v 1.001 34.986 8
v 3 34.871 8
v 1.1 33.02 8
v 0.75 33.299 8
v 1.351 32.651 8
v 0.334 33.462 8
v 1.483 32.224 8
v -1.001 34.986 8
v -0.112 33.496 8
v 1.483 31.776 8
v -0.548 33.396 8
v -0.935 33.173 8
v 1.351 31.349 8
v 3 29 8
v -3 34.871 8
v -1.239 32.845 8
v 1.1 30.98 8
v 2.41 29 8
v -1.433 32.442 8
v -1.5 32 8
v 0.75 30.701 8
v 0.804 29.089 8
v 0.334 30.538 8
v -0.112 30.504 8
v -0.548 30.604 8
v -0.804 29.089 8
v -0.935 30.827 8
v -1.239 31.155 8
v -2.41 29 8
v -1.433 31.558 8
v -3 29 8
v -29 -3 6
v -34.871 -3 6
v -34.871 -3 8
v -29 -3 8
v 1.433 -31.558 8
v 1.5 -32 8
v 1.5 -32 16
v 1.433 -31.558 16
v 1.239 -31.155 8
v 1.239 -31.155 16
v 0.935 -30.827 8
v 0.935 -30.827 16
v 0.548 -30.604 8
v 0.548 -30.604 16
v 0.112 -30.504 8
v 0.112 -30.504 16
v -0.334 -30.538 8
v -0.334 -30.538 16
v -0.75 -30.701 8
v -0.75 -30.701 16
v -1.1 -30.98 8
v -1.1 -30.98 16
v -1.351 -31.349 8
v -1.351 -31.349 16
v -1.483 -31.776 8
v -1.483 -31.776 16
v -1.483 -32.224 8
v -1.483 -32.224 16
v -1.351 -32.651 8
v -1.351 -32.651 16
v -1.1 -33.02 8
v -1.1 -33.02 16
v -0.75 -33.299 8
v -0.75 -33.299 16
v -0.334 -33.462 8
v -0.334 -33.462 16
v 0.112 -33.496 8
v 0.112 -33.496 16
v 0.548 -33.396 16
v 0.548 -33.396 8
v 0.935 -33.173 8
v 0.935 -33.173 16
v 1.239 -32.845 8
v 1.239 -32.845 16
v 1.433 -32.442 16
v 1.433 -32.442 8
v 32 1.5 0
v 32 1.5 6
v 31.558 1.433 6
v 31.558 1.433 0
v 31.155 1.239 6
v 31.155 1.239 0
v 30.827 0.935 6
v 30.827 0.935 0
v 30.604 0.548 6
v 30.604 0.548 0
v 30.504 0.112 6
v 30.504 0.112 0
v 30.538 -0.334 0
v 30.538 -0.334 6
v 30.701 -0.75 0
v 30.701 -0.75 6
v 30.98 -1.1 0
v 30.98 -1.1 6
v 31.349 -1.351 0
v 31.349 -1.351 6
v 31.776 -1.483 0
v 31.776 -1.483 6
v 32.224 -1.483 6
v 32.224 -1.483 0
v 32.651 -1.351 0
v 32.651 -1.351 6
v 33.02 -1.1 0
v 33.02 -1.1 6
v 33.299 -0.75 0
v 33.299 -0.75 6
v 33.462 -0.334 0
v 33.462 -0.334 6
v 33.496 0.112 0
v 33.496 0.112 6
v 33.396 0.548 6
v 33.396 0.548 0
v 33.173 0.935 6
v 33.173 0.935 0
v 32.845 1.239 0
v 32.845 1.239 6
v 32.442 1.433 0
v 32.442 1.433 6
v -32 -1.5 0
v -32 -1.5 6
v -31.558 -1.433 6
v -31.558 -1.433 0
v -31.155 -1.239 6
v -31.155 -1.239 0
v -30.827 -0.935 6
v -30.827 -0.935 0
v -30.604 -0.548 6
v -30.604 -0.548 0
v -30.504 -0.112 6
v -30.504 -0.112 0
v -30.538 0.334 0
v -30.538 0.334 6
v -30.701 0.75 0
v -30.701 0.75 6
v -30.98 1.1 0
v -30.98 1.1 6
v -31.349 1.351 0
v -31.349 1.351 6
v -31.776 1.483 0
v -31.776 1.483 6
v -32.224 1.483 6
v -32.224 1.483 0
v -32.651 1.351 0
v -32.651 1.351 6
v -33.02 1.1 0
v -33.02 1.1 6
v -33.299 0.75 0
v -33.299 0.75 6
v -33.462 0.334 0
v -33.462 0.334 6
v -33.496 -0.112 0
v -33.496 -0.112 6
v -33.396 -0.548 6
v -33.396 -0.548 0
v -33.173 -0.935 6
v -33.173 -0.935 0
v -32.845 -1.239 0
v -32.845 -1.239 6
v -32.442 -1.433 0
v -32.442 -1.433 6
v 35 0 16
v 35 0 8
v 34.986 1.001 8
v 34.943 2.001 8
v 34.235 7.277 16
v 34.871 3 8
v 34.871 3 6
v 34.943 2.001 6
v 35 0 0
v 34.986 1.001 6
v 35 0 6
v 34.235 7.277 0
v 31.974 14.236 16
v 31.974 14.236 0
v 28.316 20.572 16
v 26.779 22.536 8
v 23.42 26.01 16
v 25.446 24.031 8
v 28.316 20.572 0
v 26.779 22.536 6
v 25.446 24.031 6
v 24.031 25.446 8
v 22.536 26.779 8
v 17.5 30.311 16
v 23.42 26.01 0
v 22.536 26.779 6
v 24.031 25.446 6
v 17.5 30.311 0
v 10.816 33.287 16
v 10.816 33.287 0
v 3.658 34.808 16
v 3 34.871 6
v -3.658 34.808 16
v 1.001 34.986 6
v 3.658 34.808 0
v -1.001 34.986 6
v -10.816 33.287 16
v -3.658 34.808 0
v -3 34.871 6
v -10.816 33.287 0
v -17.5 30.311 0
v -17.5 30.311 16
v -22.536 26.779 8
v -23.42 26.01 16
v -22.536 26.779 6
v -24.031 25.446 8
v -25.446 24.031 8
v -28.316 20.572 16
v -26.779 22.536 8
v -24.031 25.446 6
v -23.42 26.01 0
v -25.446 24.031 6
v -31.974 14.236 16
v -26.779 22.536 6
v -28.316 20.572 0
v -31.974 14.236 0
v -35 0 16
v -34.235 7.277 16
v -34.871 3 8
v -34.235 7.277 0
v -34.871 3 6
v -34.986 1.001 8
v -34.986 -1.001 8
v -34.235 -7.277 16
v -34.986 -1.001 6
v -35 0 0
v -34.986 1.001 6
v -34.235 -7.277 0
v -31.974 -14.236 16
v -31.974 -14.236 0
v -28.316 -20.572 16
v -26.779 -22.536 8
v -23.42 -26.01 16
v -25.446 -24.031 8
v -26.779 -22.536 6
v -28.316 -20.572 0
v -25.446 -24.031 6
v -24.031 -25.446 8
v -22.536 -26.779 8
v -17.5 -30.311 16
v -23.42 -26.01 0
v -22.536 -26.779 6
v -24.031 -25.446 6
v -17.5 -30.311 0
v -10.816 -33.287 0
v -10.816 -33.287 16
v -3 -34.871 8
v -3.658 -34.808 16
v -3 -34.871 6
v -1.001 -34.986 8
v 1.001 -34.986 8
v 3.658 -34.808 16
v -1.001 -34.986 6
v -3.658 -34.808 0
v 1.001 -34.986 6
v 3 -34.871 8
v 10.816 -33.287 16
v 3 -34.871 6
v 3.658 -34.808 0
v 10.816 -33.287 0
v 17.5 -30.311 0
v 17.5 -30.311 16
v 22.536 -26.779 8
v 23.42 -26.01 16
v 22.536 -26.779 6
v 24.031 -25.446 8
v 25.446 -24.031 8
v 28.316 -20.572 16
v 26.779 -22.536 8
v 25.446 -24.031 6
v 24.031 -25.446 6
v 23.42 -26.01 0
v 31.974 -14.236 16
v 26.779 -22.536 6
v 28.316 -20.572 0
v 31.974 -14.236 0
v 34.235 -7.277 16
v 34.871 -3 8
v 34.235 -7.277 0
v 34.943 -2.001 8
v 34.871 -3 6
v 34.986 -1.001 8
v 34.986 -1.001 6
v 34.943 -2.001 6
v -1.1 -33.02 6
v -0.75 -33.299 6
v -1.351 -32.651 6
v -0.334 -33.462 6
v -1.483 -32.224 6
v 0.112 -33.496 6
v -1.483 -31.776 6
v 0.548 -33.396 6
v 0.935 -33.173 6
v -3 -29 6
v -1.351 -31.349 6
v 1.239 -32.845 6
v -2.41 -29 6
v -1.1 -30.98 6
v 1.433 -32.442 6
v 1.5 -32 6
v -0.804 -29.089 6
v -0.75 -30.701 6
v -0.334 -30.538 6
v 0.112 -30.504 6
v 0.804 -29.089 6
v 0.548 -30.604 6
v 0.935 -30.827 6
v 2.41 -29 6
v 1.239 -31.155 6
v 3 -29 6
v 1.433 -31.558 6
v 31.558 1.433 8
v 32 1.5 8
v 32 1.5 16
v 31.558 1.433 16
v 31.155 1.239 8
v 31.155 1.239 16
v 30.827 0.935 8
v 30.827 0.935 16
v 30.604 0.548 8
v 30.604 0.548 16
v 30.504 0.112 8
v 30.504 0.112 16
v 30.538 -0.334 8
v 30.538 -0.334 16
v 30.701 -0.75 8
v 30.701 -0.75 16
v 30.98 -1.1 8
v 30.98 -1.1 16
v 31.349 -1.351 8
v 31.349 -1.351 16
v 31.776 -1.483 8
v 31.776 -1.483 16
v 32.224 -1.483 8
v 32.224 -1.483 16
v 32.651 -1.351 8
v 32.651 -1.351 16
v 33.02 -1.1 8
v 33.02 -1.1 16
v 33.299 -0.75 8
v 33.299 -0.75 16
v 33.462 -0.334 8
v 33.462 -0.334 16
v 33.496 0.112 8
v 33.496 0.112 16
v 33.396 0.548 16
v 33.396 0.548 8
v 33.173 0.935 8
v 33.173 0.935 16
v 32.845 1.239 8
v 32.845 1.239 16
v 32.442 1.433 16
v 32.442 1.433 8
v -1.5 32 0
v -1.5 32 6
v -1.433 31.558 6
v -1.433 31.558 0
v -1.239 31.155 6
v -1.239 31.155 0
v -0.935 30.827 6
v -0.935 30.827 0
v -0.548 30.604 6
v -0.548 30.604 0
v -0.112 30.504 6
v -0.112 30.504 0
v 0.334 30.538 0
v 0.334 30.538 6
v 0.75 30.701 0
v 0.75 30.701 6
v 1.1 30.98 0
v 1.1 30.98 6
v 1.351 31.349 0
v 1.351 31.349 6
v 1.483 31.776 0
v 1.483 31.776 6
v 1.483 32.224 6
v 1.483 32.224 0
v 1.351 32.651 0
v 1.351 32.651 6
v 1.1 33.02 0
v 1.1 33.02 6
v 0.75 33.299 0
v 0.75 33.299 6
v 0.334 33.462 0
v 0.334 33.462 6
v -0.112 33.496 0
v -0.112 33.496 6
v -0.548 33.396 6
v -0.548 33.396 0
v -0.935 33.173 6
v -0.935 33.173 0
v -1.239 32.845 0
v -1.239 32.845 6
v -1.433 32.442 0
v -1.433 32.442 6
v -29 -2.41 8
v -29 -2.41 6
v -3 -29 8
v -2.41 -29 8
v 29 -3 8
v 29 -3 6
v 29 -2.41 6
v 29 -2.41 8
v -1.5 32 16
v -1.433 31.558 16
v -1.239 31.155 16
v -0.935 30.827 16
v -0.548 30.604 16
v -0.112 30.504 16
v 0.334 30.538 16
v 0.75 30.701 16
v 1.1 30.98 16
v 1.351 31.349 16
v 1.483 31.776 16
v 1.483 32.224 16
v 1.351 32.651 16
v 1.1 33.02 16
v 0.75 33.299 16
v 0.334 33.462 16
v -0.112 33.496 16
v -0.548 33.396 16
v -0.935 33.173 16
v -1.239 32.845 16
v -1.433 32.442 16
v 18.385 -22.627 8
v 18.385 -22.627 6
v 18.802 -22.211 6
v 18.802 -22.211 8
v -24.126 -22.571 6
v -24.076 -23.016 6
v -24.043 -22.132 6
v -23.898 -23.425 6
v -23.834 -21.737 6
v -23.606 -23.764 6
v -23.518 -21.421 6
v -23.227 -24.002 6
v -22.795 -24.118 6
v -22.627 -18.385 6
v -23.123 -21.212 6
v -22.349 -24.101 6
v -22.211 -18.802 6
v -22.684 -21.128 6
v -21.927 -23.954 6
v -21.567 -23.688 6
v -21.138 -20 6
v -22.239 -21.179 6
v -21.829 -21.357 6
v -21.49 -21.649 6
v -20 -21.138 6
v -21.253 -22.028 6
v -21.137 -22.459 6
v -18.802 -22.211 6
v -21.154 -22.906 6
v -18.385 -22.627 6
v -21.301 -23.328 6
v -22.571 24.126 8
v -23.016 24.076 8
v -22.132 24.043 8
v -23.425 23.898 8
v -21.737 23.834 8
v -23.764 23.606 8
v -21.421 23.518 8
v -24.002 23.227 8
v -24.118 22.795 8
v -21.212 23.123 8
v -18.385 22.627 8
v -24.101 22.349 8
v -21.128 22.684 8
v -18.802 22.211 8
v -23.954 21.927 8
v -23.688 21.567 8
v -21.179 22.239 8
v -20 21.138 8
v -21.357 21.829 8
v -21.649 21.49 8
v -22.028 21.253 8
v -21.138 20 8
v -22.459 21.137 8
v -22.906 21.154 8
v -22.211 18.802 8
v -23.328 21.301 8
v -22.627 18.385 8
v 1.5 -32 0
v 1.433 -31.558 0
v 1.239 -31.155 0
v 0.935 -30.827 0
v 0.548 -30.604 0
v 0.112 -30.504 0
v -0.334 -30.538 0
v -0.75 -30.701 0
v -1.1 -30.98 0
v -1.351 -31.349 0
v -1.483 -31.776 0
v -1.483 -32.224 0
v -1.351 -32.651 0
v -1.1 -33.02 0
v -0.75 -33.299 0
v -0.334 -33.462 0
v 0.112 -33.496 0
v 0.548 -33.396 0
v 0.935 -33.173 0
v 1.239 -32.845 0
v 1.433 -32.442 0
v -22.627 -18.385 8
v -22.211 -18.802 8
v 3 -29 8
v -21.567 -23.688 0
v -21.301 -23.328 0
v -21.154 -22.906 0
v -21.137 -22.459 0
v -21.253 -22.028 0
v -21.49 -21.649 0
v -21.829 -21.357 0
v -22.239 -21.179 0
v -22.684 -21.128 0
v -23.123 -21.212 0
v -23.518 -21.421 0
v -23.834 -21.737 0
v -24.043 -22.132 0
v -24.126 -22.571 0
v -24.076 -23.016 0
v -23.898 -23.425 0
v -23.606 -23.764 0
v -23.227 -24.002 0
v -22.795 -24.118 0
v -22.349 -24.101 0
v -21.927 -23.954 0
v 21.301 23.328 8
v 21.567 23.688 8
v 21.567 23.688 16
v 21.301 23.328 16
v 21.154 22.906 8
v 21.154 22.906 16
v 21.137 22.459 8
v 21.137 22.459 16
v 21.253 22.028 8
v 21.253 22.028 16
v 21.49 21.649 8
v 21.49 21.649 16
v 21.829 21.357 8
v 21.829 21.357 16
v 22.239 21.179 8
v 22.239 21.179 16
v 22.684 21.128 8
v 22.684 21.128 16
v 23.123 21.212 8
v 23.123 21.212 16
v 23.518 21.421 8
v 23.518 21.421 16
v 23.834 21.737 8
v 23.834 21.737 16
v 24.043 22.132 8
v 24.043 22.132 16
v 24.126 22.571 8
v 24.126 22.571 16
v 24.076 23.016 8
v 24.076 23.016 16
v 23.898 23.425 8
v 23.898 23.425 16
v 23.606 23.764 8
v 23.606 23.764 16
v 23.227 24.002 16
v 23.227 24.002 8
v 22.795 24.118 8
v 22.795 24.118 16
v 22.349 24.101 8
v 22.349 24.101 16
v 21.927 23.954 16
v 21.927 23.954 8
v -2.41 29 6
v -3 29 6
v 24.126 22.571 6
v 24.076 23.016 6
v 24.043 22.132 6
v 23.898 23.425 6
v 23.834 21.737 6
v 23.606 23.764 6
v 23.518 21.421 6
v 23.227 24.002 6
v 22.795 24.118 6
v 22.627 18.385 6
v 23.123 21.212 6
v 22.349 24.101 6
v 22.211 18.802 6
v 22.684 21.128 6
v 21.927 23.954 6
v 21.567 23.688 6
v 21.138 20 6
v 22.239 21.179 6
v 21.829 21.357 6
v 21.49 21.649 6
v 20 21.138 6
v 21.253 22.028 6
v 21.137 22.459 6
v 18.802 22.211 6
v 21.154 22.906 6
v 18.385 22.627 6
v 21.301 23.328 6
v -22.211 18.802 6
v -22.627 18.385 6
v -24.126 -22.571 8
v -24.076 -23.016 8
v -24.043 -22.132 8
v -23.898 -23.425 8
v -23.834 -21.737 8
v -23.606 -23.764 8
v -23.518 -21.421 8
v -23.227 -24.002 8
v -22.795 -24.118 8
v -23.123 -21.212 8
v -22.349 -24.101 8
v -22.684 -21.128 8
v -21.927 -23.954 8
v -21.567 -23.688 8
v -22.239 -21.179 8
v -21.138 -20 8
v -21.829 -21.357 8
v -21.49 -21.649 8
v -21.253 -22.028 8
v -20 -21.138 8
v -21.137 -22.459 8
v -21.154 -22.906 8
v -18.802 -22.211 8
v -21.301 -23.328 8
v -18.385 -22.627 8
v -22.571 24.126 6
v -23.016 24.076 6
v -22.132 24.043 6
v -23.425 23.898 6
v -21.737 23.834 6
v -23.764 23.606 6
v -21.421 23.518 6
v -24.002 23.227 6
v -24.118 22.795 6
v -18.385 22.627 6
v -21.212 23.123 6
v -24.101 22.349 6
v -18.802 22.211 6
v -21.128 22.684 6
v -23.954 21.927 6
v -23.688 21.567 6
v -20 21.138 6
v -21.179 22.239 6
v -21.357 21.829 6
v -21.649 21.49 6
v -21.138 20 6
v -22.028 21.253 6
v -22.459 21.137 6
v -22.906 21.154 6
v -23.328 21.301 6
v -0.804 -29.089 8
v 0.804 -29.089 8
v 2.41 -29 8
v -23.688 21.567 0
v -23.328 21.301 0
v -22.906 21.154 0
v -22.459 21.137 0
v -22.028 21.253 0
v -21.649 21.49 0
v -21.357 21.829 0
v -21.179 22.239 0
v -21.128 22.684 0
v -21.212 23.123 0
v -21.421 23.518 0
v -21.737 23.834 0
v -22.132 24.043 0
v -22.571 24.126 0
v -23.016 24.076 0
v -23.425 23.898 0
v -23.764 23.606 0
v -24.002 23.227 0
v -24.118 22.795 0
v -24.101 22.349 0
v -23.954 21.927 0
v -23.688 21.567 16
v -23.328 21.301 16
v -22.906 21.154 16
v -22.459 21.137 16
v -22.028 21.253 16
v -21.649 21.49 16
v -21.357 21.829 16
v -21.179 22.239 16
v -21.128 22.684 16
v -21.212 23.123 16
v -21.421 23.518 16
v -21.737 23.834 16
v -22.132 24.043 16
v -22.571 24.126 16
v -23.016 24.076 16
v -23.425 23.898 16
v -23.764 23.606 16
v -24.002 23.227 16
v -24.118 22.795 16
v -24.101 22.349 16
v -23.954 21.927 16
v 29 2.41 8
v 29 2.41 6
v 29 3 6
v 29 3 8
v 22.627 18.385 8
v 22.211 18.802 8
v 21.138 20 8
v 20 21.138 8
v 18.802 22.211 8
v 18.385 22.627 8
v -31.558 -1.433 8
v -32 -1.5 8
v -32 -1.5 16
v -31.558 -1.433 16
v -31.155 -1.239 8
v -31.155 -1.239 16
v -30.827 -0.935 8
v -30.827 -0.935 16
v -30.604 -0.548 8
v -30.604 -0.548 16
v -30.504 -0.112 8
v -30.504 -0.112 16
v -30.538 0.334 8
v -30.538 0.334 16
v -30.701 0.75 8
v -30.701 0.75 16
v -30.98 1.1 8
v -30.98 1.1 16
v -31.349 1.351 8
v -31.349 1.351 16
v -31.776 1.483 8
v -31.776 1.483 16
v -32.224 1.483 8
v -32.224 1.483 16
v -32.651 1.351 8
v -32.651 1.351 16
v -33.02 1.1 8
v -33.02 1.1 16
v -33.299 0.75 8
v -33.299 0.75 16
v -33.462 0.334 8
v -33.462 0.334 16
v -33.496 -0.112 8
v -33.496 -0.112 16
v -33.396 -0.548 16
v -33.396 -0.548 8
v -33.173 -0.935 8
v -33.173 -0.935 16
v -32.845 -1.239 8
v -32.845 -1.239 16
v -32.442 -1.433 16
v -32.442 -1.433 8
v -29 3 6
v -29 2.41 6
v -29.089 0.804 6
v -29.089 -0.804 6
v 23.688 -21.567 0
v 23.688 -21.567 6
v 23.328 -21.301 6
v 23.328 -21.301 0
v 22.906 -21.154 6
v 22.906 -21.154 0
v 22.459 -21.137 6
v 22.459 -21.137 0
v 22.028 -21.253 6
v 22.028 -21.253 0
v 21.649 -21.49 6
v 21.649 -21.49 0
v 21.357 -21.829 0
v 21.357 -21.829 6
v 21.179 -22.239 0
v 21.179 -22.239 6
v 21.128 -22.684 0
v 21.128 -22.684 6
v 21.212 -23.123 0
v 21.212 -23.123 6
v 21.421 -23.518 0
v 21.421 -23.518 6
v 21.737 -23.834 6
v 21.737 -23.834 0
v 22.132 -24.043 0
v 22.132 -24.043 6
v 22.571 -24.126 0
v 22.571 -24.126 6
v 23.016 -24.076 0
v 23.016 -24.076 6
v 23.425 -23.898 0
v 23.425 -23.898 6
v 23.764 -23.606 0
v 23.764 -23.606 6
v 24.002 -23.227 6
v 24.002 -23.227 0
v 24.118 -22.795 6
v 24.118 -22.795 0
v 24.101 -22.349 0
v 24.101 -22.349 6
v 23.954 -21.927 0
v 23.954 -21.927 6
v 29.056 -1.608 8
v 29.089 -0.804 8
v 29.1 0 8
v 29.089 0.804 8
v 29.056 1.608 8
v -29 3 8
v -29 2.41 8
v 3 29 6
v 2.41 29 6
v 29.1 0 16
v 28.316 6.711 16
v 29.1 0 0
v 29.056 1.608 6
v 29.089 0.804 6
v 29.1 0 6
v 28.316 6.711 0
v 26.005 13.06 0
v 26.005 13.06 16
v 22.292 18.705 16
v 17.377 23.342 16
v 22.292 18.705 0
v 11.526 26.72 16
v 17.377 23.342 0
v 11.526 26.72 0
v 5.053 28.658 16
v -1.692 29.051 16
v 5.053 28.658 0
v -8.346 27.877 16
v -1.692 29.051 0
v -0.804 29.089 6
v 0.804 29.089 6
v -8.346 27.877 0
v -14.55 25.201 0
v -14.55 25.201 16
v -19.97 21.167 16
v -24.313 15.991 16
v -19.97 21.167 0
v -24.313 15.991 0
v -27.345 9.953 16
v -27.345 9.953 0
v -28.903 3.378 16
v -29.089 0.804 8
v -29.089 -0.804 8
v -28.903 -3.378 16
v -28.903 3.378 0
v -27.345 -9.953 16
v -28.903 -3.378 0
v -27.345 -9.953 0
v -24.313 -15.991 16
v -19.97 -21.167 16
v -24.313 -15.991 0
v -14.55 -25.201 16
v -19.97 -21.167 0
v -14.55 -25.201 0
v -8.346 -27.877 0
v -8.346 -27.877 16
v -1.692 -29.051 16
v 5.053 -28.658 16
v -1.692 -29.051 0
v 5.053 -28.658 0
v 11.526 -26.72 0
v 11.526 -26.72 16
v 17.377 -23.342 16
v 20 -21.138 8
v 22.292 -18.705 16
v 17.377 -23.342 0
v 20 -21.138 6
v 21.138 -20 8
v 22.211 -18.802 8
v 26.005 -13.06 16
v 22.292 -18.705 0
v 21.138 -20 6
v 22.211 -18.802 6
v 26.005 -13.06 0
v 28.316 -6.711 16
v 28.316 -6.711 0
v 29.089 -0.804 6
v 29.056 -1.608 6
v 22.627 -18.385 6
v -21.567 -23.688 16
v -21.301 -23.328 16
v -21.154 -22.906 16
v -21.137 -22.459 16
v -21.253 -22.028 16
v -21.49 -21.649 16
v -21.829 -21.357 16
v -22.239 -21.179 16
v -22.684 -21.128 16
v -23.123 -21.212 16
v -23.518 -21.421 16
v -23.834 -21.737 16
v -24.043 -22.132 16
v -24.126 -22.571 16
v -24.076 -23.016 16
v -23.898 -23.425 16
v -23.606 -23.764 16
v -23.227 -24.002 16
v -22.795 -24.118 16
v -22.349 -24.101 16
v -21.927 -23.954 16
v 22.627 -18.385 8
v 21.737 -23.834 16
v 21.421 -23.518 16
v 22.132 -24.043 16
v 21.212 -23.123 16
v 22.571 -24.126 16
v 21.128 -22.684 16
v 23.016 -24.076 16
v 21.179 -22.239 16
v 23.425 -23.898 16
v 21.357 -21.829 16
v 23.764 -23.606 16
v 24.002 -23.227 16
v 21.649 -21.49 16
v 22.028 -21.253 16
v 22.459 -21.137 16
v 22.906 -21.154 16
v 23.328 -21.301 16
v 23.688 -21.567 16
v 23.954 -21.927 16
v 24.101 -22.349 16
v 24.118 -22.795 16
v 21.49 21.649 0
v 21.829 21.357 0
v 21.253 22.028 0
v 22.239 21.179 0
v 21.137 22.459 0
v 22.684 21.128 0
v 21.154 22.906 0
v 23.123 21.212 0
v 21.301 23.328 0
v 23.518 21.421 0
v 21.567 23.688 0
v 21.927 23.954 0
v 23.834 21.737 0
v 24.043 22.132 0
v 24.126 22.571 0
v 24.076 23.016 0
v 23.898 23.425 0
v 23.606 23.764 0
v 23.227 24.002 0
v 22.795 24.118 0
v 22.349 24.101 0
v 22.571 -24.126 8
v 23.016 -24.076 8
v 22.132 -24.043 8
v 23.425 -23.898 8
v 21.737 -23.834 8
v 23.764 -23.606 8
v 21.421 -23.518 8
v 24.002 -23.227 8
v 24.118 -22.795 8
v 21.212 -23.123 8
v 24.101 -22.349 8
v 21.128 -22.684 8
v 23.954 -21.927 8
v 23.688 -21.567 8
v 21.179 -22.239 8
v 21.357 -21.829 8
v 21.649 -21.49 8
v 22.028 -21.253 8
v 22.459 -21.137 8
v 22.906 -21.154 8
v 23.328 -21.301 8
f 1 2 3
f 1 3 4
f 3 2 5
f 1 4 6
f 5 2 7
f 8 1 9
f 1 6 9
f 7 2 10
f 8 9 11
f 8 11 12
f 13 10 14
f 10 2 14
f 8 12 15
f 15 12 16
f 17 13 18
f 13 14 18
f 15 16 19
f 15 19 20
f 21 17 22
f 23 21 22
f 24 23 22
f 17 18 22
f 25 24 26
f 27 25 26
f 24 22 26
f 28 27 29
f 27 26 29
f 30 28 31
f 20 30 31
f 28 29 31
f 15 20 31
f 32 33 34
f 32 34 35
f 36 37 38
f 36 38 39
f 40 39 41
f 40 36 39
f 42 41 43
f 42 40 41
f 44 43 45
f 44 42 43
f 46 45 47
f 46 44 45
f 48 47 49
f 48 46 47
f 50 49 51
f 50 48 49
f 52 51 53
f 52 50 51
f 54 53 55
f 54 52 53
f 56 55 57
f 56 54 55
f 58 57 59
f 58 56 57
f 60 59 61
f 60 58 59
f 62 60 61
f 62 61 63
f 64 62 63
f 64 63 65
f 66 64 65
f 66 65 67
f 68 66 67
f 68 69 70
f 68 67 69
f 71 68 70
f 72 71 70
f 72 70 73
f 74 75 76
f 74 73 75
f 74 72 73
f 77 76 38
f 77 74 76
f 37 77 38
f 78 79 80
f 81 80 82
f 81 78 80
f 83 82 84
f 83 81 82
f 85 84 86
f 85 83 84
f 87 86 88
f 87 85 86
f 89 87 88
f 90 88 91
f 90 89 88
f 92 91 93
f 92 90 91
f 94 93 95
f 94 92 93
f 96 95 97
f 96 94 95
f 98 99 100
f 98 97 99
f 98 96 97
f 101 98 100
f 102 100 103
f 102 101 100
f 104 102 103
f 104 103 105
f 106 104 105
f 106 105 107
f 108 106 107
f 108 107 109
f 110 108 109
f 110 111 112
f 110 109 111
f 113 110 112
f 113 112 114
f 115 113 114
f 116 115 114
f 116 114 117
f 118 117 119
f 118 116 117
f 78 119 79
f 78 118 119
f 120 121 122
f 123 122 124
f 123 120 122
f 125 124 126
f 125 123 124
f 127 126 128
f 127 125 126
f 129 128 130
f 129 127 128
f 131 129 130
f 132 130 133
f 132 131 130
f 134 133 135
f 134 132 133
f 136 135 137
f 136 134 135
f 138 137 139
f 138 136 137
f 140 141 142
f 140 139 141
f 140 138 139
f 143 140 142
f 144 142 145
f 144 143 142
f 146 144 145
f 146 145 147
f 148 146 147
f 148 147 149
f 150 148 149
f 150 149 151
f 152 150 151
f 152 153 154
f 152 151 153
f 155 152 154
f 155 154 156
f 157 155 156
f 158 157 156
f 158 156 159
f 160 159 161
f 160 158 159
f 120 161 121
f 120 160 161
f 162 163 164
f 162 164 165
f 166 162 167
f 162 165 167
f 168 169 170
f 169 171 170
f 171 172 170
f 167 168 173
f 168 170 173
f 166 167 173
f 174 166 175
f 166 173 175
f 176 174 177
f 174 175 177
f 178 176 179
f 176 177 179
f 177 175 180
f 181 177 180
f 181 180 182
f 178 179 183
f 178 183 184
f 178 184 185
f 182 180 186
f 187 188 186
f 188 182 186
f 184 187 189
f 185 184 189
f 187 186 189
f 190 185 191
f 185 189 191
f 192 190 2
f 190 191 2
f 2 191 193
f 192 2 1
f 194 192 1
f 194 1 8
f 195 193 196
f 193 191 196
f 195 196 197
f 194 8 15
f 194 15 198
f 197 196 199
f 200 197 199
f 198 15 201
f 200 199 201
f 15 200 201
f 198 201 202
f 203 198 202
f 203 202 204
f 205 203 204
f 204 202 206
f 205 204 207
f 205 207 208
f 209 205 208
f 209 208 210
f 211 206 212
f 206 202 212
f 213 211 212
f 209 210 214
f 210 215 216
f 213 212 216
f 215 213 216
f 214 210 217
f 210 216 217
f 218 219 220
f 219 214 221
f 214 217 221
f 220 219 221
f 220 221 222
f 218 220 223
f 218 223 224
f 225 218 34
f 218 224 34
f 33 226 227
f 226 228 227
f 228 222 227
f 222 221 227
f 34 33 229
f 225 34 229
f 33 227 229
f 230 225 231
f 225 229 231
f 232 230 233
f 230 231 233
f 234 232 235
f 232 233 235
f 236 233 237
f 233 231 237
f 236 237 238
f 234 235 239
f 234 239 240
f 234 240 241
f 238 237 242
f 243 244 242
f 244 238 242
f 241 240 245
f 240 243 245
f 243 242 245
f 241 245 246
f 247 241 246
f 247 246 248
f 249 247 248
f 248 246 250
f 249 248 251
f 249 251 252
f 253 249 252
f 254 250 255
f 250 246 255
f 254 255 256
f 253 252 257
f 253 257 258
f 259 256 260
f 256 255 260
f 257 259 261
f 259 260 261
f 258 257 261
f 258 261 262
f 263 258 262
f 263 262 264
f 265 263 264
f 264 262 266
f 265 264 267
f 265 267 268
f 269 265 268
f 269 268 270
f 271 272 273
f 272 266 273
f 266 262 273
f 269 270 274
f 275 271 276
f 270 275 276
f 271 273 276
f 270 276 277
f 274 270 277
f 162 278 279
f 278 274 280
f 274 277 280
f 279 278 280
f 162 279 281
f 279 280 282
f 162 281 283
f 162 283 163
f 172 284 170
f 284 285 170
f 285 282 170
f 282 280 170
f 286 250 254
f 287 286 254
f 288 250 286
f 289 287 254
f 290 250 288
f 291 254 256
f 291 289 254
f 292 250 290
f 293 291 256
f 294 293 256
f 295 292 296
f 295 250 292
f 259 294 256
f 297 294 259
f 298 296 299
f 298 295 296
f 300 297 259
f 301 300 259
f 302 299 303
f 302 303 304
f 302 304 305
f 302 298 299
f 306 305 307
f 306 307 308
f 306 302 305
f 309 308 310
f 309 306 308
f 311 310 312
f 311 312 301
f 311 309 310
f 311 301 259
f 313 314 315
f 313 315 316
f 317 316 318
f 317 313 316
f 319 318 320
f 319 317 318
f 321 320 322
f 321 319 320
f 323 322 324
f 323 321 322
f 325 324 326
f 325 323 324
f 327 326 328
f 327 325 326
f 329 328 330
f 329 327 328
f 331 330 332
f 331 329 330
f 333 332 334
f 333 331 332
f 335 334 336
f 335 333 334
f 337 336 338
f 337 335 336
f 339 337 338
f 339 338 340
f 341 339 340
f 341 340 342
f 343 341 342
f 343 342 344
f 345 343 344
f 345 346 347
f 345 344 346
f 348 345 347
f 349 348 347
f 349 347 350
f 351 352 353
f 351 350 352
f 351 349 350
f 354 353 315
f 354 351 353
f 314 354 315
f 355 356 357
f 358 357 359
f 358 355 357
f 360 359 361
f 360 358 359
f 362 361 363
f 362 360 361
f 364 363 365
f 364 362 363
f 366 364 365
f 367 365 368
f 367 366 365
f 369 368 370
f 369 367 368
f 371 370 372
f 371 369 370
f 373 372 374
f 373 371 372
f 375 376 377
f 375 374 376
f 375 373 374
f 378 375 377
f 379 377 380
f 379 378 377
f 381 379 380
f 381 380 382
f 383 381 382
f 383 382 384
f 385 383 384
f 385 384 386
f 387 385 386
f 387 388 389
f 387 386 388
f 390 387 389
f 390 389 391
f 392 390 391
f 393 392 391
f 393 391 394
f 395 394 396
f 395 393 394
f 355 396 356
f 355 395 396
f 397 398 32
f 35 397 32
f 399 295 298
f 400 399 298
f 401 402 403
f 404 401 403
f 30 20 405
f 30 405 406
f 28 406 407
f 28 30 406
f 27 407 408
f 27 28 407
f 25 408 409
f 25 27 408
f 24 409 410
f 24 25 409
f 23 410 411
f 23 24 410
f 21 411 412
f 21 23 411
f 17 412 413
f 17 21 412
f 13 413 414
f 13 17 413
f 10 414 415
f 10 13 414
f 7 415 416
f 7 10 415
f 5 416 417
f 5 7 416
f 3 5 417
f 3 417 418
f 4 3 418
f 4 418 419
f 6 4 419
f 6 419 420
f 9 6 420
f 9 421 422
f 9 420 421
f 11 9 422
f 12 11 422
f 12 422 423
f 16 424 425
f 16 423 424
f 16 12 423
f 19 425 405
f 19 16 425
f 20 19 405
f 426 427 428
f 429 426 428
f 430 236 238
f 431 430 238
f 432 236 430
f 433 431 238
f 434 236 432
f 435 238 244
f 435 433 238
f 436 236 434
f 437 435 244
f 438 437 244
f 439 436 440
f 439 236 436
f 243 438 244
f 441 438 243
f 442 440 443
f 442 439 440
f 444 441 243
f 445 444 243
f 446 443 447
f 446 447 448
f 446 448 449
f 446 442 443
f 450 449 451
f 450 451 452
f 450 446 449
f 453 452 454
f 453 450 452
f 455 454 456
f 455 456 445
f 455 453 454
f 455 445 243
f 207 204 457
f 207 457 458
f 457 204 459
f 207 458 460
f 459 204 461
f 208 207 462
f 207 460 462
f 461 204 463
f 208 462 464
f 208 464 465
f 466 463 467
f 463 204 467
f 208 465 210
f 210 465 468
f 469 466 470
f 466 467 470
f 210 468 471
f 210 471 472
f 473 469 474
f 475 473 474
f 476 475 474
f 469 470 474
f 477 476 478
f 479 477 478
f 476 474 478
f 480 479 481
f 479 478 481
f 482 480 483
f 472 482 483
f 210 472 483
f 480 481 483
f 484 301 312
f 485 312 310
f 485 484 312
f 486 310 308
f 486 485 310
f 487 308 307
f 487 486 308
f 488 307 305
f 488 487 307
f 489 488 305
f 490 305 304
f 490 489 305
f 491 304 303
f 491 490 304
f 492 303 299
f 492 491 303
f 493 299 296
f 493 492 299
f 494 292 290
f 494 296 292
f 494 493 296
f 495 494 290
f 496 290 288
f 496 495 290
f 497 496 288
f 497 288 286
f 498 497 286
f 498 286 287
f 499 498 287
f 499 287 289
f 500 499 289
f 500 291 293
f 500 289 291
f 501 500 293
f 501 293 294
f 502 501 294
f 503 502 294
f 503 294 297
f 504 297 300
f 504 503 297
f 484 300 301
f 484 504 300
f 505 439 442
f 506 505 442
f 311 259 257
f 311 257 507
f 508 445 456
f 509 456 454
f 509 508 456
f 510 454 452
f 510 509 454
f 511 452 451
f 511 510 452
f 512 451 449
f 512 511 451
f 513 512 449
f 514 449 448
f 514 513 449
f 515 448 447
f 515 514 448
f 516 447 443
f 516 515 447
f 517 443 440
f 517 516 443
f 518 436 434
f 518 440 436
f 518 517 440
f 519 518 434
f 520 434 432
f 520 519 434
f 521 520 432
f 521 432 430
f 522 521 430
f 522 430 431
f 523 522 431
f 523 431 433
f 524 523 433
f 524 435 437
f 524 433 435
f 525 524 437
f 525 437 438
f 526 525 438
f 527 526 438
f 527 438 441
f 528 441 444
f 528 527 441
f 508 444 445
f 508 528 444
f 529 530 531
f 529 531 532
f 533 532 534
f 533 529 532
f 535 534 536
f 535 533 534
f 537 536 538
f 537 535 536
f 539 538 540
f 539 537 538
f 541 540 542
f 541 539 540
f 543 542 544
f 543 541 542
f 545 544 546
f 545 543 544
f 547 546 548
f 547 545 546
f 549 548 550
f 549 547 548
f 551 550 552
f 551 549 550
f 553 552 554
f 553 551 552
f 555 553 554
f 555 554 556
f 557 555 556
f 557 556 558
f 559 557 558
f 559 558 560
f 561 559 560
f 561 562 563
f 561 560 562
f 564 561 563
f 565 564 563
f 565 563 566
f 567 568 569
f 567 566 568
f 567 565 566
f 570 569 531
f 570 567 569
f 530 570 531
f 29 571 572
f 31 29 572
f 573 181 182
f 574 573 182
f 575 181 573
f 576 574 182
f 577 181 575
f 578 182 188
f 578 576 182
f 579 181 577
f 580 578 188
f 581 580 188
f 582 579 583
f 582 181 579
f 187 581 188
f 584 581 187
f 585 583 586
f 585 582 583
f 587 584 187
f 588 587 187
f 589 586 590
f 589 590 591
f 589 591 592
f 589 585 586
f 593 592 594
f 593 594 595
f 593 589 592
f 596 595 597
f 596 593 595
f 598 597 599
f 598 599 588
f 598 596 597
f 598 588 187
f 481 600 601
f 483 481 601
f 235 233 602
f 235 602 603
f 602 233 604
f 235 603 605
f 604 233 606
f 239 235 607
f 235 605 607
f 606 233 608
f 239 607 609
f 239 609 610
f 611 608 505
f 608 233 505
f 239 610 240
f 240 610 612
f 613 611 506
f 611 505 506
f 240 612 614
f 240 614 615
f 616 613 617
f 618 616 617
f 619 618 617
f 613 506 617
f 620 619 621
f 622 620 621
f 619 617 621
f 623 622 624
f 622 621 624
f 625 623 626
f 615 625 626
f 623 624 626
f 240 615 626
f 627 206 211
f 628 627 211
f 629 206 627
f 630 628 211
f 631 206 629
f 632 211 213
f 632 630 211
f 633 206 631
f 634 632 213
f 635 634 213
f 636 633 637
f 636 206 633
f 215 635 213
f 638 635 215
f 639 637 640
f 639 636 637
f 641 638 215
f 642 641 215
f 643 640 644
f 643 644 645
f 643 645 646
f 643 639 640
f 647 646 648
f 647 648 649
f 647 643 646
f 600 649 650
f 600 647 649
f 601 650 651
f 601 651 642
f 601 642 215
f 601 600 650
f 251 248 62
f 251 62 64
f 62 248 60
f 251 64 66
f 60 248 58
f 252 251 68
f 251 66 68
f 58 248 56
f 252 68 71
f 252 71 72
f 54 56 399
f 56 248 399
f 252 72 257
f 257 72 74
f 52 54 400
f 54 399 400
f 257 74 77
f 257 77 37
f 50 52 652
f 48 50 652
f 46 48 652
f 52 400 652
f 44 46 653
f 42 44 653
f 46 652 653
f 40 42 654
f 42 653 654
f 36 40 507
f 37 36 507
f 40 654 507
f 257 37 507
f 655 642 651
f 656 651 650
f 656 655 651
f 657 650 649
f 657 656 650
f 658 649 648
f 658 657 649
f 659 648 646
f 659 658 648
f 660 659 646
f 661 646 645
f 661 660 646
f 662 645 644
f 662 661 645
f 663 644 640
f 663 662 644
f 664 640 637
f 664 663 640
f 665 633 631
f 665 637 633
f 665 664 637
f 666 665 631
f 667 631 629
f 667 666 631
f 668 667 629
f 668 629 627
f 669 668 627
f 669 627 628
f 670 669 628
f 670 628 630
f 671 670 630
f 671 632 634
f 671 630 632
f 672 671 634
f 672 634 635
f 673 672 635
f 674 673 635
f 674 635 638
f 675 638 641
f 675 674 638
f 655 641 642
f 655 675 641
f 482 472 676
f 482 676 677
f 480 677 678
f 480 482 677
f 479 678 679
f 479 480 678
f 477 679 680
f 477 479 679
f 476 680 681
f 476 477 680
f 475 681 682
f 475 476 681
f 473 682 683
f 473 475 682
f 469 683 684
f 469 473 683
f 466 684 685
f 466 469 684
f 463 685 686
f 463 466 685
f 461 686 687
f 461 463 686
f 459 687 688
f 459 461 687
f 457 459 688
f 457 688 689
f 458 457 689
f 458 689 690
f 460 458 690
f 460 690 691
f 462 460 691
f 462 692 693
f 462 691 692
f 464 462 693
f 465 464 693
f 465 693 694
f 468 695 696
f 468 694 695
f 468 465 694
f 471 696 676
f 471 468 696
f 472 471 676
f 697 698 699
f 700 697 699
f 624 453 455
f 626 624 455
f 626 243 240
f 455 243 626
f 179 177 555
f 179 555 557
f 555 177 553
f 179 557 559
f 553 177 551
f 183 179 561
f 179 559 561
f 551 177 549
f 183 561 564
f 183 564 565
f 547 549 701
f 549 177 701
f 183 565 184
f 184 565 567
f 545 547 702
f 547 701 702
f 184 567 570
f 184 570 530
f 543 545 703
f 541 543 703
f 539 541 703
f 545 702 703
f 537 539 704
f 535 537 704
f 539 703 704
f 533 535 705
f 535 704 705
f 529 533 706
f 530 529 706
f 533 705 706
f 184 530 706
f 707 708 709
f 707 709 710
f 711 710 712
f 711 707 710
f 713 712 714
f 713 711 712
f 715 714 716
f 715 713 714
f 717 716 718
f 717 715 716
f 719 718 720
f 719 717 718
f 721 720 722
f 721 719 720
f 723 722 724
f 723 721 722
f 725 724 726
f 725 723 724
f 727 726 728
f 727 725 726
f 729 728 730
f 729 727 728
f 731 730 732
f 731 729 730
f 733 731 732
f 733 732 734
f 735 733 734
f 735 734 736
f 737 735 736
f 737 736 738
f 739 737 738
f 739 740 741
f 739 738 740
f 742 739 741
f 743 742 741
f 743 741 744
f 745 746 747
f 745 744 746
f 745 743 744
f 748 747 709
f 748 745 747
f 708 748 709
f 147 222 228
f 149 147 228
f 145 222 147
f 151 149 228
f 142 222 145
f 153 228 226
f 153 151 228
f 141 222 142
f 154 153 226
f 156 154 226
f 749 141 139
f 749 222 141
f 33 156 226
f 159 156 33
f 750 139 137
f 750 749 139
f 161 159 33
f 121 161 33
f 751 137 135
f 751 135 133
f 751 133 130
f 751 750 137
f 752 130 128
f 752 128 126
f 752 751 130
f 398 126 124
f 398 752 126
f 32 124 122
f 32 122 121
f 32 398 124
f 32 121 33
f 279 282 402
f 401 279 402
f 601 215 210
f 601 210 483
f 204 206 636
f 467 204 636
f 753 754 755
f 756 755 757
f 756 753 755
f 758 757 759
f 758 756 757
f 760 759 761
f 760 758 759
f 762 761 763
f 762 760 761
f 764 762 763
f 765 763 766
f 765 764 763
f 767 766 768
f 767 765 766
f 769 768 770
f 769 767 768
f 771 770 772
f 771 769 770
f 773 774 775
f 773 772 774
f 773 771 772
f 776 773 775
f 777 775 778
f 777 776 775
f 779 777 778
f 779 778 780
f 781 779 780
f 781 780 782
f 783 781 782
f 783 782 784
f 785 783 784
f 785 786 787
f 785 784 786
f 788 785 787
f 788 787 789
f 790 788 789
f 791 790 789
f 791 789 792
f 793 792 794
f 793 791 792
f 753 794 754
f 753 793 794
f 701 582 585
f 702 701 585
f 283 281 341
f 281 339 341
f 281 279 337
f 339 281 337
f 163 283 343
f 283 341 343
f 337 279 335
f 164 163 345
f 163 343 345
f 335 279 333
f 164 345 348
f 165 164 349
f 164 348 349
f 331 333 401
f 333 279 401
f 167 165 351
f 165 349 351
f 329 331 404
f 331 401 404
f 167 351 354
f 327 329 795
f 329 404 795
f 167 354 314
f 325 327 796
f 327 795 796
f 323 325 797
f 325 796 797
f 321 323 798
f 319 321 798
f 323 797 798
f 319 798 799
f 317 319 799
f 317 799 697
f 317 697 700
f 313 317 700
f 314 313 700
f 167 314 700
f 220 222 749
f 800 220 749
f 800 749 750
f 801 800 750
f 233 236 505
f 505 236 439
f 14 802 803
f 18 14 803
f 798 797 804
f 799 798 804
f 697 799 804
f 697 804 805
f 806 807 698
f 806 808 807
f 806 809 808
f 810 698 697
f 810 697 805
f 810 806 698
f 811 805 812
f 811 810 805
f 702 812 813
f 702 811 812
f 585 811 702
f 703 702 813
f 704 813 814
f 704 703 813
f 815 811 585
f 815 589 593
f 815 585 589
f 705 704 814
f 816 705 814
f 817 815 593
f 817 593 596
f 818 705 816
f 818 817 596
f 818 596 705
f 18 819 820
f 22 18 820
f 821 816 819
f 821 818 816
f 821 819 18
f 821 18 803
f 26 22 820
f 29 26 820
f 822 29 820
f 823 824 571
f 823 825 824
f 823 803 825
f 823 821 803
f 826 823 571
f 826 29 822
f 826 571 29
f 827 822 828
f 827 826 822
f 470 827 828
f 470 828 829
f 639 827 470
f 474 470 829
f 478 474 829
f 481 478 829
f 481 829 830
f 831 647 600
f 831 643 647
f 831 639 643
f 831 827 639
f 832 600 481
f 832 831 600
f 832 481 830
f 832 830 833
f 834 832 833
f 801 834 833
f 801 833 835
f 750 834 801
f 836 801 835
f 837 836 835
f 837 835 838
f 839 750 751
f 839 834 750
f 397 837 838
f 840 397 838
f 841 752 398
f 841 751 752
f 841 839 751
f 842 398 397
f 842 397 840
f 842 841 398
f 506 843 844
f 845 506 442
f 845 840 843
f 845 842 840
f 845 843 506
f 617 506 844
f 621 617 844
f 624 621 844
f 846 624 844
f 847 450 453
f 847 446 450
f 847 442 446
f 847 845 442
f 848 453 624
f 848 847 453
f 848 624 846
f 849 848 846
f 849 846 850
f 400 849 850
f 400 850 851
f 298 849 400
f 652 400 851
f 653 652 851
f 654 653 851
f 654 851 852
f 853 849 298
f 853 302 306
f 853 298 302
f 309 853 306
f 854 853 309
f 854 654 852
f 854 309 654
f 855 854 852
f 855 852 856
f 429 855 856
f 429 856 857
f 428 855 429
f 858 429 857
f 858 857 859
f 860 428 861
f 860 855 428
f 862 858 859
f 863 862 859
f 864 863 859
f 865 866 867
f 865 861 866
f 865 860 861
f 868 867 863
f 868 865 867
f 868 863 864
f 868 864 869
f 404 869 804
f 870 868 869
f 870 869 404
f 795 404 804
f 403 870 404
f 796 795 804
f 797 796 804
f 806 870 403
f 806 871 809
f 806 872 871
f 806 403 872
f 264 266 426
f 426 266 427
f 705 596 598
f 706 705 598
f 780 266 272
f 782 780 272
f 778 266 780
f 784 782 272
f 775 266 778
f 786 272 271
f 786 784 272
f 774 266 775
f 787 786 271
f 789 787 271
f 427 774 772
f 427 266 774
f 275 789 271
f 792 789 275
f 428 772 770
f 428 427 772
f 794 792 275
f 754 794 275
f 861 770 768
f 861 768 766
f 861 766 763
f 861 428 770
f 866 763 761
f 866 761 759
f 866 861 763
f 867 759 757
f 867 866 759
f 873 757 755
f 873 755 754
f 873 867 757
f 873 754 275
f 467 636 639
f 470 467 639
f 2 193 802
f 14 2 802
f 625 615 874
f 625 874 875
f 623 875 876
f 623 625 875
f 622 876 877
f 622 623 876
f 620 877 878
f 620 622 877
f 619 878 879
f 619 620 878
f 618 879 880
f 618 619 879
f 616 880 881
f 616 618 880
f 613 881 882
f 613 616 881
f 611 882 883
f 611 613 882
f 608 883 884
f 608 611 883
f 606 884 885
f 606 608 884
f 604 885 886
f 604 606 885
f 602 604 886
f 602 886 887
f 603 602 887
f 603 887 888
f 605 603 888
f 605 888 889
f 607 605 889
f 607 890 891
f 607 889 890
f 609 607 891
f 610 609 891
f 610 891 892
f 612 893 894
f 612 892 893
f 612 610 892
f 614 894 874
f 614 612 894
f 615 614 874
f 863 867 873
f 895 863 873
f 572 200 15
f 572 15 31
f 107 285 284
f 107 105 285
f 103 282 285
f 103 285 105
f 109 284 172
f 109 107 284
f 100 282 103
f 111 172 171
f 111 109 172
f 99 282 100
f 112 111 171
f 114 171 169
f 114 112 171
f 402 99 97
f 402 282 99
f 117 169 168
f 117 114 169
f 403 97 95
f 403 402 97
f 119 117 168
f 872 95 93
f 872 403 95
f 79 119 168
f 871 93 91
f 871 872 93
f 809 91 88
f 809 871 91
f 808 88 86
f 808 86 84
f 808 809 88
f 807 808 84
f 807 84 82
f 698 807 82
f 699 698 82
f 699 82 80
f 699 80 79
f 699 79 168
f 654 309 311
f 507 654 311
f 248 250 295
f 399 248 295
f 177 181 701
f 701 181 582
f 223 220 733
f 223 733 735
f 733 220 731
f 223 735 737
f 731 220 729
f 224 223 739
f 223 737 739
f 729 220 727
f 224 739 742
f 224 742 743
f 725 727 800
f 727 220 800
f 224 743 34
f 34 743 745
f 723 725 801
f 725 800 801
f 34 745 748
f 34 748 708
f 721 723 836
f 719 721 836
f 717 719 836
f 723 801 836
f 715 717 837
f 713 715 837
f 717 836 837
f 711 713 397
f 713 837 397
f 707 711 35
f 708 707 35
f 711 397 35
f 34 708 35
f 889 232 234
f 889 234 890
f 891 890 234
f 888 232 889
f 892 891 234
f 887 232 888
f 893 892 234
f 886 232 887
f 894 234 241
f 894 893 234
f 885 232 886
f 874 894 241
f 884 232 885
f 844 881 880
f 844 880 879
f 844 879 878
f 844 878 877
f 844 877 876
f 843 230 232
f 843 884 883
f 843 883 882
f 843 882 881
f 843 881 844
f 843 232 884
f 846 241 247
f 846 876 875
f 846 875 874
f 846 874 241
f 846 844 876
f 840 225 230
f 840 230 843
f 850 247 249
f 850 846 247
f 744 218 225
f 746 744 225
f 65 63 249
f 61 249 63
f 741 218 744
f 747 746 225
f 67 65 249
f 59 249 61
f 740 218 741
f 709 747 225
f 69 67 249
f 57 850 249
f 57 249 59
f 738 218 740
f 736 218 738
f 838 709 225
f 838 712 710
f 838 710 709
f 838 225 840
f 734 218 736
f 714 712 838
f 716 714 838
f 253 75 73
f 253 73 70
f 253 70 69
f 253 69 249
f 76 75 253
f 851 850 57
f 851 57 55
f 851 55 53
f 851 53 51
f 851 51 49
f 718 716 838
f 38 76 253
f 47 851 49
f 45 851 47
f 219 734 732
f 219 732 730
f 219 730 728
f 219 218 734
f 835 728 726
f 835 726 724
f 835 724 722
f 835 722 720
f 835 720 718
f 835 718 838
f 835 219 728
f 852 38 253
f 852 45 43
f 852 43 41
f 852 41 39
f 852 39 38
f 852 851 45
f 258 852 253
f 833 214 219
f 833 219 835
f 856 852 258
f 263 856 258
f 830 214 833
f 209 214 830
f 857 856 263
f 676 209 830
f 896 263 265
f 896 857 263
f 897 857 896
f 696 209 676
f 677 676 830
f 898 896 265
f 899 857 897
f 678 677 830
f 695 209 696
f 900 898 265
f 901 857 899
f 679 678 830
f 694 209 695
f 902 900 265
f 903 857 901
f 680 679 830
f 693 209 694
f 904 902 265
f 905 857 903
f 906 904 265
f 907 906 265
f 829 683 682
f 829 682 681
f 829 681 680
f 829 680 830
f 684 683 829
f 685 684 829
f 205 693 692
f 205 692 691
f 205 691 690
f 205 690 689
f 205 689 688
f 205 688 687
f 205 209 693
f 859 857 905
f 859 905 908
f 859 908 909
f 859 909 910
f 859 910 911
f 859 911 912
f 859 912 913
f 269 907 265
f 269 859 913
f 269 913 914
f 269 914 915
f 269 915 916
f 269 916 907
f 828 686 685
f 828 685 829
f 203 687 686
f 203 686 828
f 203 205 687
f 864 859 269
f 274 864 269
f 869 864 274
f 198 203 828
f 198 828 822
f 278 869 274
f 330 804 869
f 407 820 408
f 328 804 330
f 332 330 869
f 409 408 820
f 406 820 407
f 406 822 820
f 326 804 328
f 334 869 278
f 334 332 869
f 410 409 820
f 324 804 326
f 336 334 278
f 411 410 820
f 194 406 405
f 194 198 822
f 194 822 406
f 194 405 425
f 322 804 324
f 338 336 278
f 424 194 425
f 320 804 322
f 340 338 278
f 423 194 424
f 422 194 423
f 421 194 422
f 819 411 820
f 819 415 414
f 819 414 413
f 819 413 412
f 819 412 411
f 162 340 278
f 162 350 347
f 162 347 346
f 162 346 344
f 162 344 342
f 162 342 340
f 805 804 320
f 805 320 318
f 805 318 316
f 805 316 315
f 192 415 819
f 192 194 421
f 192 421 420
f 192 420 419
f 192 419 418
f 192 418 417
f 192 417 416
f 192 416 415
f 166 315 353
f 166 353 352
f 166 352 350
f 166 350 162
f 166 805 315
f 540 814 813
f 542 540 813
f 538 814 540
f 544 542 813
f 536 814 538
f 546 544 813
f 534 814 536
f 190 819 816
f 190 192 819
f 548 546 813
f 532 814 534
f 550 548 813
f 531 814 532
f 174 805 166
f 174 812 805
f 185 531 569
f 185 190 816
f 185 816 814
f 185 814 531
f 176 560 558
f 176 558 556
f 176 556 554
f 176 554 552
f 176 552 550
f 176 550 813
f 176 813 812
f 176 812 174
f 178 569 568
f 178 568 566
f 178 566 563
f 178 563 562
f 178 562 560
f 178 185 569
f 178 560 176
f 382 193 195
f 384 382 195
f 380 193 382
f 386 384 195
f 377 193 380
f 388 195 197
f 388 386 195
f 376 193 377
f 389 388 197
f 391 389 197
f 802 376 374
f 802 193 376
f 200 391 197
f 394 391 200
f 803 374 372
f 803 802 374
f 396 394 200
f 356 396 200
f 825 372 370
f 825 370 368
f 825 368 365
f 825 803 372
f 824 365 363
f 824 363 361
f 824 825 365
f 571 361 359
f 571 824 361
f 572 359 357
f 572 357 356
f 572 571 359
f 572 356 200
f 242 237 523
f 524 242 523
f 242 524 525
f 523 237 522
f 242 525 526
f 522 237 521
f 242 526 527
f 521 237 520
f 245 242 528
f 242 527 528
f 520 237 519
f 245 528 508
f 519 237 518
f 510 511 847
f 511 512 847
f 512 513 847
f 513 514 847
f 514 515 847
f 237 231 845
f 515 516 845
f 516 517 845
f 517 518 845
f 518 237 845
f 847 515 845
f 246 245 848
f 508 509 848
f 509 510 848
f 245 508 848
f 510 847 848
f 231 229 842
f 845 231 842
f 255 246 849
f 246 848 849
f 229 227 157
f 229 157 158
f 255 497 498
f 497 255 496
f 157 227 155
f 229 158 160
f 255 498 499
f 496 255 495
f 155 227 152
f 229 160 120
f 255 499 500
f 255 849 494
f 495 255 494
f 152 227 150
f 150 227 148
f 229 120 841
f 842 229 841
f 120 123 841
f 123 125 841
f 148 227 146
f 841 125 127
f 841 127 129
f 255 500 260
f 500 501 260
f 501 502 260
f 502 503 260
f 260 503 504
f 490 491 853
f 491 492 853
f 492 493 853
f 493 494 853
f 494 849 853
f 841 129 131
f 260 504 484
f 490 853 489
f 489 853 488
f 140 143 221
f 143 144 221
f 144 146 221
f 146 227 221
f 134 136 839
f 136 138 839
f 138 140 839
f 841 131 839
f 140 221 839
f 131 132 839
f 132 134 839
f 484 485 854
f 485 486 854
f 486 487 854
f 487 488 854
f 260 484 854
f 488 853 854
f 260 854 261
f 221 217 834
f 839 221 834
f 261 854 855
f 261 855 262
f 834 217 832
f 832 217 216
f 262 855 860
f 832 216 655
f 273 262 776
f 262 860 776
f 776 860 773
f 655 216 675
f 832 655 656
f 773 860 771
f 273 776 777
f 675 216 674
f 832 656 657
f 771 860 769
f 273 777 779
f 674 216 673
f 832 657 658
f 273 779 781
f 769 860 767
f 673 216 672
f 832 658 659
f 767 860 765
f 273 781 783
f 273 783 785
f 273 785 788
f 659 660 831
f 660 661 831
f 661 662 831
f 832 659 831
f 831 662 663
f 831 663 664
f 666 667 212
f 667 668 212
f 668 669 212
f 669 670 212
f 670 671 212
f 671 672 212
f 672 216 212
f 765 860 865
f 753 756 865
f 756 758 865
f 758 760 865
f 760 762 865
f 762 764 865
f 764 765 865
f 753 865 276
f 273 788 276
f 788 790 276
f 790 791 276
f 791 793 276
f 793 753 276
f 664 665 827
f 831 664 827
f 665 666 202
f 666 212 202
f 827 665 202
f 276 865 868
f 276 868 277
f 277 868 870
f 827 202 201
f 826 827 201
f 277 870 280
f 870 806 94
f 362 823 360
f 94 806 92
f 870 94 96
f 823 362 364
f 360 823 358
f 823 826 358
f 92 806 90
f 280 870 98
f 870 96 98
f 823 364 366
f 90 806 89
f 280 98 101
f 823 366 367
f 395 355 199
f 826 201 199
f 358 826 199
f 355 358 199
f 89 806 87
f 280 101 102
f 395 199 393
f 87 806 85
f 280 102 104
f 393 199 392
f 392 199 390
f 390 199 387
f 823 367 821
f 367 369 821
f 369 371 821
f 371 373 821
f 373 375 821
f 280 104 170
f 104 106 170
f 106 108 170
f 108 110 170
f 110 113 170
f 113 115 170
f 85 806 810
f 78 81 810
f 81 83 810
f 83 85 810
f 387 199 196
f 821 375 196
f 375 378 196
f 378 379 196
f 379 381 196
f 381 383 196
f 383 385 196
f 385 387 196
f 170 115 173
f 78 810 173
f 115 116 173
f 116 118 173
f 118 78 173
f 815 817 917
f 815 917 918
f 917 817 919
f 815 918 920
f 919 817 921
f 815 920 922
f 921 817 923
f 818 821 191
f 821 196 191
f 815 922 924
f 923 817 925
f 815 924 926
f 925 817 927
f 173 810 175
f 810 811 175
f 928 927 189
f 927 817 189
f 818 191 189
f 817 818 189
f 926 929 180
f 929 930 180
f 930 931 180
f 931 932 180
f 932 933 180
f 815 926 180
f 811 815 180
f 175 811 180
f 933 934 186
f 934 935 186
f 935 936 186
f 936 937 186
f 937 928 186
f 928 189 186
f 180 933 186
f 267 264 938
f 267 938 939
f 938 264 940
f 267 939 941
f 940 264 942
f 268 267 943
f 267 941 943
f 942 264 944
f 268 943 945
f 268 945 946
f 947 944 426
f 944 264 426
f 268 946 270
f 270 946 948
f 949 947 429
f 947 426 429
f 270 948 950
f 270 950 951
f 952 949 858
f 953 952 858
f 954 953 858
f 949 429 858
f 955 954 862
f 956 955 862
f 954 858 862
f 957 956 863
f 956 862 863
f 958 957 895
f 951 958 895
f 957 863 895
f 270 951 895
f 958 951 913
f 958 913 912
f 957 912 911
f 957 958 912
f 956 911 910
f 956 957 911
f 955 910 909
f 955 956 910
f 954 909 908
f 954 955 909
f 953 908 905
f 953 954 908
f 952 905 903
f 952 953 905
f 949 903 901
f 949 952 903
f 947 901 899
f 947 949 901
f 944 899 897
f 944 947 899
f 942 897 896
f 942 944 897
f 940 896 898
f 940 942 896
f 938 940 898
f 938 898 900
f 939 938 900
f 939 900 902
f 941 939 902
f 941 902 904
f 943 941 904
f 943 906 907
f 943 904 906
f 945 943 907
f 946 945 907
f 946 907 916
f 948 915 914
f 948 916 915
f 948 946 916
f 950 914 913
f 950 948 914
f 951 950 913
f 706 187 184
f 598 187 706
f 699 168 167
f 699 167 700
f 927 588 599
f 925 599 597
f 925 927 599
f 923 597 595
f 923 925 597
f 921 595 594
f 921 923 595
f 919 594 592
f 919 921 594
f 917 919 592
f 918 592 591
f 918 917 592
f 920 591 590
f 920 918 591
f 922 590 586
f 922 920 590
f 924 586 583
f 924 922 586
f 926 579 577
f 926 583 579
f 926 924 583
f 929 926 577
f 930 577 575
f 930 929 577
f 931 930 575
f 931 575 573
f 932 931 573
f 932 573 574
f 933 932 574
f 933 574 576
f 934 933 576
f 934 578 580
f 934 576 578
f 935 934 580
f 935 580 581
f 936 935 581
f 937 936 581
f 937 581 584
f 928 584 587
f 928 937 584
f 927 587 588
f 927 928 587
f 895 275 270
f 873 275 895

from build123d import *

# Parameters (mm, degrees)
BOX697_W                     = 6
BOX697_H                     = 6
BOX697_DEPTH                 = 2
BOX697_PLACEMENT_ANGLE       = 45
BOX703_W                     = 6
BOX703_H                     = 6
BOX703_DEPTH                 = 2
BOX703_PLACEMENT_ANGLE       = 45
BOX702_W                     = 6
BOX702_H                     = 6
BOX702_DEPTH                 = 2
BOX701_W                     = 6
BOX701_H                     = 6
BOX701_DEPTH                 = 2
BOX701_PLACEMENT_ANGLE       = 225
BOX700_W                     = 6
BOX700_H                     = 6
BOX700_DEPTH                 = 2
BOX699_W                     = 6
BOX699_H                     = 6
BOX699_DEPTH                 = 2
BOX699_PLACEMENT_ANGLE       = 135
BOX698_W                     = 6
BOX698_H                     = 6
BOX698_DEPTH                 = 2
BOX696_W                     = 6
BOX696_H                     = 6
BOX696_DEPTH                 = 2
CYLINDER1770_R               = 1.5
CYLINDER1770_DEPTH           = 30
CYLINDER1770_PLACEMENT_ANGLE = 45
CYLINDER1768_R               = 1.5
CYLINDER1768_DEPTH           = 30
CYLINDER1764_R               = 1.5
CYLINDER1764_DEPTH           = 30
CYLINDER1764_PLACEMENT_ANGLE = 135
CYLINDER1767_R               = 1.5
CYLINDER1767_DEPTH           = 30
CYLINDER1765_R               = 1.5
CYLINDER1765_DEPTH           = 30
CYLINDER1765_PLACEMENT_ANGLE = 225
CYLINDER1769_R               = 1.5
CYLINDER1769_DEPTH           = 30
CYLINDER1766_R               = 1.5
CYLINDER1766_DEPTH           = 30
CYLINDER1766_PLACEMENT_ANGLE = 45
CYLINDER1771_R               = 1.5
CYLINDER1771_DEPTH           = 30
TUBE086_R                    = 35
TUBE086_R_2                  = 29.1
TUBE086_DEPTH                = 16


with BuildPart() as krychle697:
    # Box697 → Box697 (new body)
    with BuildSketch(Plane.XY):
        with Locations((3, 3)):
            Rectangle(BOX697_W, BOX697_H)
    extrude(amount=BOX697_DEPTH)


with BuildPart() as krychle697_1:
    # Box697 placement: moved
    add(krychle697.part.moved(Location((22.627417, -26.870058, 6))).rotate(Axis((22.627417, -26.870058, 6), (0, 0, 1)), BOX697_PLACEMENT_ANGLE))


with BuildPart() as krychle703:
    # Box703 → Box703 (new body)
    with BuildSketch(Plane.XY):
        with Locations((3, 3)):
            Rectangle(BOX703_W, BOX703_H)
    extrude(amount=BOX703_DEPTH)


with BuildPart() as krychle703_1:
    # Box703 placement: moved
    add(krychle703.part.moved(Location((-26.870058, -22.627417, 6))).rotate(Axis((-26.870058, -22.627417, 6), (0, 0, -1)), BOX703_PLACEMENT_ANGLE))


with BuildPart() as krychle702:
    # Box702 → Box702 (new body)
    with BuildSketch(Plane(origin=(-35, 3, 6), x_dir=(0, -1, 0), z_dir=(0, 0, 1))):
        with Locations((3, 3)):
            Rectangle(BOX702_W, BOX702_H)
    extrude(amount=BOX702_DEPTH)


with BuildPart() as krychle701:
    # Box701 → Box701 (new body)
    with BuildSketch(Plane.XY):
        with Locations((3, 3)):
            Rectangle(BOX701_W, BOX701_H)
    extrude(amount=BOX701_DEPTH)


with BuildPart() as krychle701_1:
    # Box701 placement: moved
    add(krychle701.part.moved(Location((-22.627417, 26.870058, 6))).rotate(Axis((-22.627417, 26.870058, 6), (0, 0, 1)), BOX701_PLACEMENT_ANGLE))


with BuildPart() as krychle700:
    # Box700 → Box700 (new body)
    with BuildSketch(Plane(origin=(3, 35, 6), x_dir=(-1, 0, 0), z_dir=(0, 0, 1))):
        with Locations((3, 3)):
            Rectangle(BOX700_W, BOX700_H)
    extrude(amount=BOX700_DEPTH)


with BuildPart() as krychle699:
    # Box699 → Box699 (new body)
    with BuildSketch(Plane.XY):
        with Locations((3, 3)):
            Rectangle(BOX699_W, BOX699_H)
    extrude(amount=BOX699_DEPTH)


with BuildPart() as krychle699_1:
    # Box699 placement: moved
    add(krychle699.part.moved(Location((26.870058, 22.627417, 6))).rotate(Axis((26.870058, 22.627417, 6), (0, 0, 1)), BOX699_PLACEMENT_ANGLE))


with BuildPart() as krychle698:
    # Box698 → Box698 (new body)
    with BuildSketch(Plane(origin=(35, -3, 6), x_dir=(0, 1, 0), z_dir=(0, 0, 1))):
        with Locations((3, 3)):
            Rectangle(BOX698_W, BOX698_H)
    extrude(amount=BOX698_DEPTH)


with BuildPart() as compound878:
    # Box696 → Box696 (new body)
    with BuildSketch(Plane(origin=(-3, -35, 6), x_dir=(1, 0, 0), z_dir=(0, 0, 1))):
        with Locations((3, 3)):
            Rectangle(BOX696_W, BOX696_H)
    extrude(amount=BOX696_DEPTH)

    # Compound878: union Krychle697, Krychle703, Krychle702, Krychle701, Krychle700, Krychle699, Krychle698
    add(krychle697_1.part)
    add(krychle703_1.part)
    add(krychle702.part)
    add(krychle701_1.part)
    add(krychle700.part)
    add(krychle699_1.part)
    add(krychle698.part)


with BuildPart() as v_lec1770:
    # Cylinder1770 → Cylinder1770 (new body)
    with BuildSketch(Plane.XY):
        Circle(CYLINDER1770_R)
    extrude(amount=CYLINDER1770_DEPTH)


with BuildPart() as v_lec1770_1:
    # Cylinder1770 placement: moved
    add(v_lec1770.part.moved(Location((22.627417, -22.627417, 0))).rotate(Axis((22.627417, -22.627417, 0), (0, 0, 1)), CYLINDER1770_PLACEMENT_ANGLE))


with BuildPart() as v_lec1768:
    # Cylinder1768 → Cylinder1768 (new body)
    with BuildSketch(Plane(origin=(32, 0, 0), x_dir=(0, 1, 0), z_dir=(0, 0, 1))):
        Circle(CYLINDER1768_R)
    extrude(amount=CYLINDER1768_DEPTH)


with BuildPart() as v_lec1764:
    # Cylinder1764 → Cylinder1764 (new body)
    with BuildSketch(Plane.XY):
        Circle(CYLINDER1764_R)
    extrude(amount=CYLINDER1764_DEPTH)


with BuildPart() as v_lec1764_1:
    # Cylinder1764 placement: moved
    add(v_lec1764.part.moved(Location((22.627417, 22.627417, 0))).rotate(Axis((22.627417, 22.627417, 0), (0, 0, 1)), CYLINDER1764_PLACEMENT_ANGLE))


with BuildPart() as v_lec1767:
    # Cylinder1767 → Cylinder1767 (new body)
    with BuildSketch(Plane(origin=(0, 32, 0), x_dir=(-1, 0, 0), z_dir=(0, 0, 1))):
        Circle(CYLINDER1767_R)
    extrude(amount=CYLINDER1767_DEPTH)


with BuildPart() as v_lec1765:
    # Cylinder1765 → Cylinder1765 (new body)
    with BuildSketch(Plane.XY):
        Circle(CYLINDER1765_R)
    extrude(amount=CYLINDER1765_DEPTH)


with BuildPart() as v_lec1765_1:
    # Cylinder1765 placement: moved
    add(v_lec1765.part.moved(Location((-22.627417, 22.627417, 0))).rotate(Axis((-22.627417, 22.627417, 0), (0, 0, 1)), CYLINDER1765_PLACEMENT_ANGLE))


with BuildPart() as v_lec1769:
    # Cylinder1769 → Cylinder1769 (new body)
    with BuildSketch(Plane(origin=(-32, 0, 0), x_dir=(0, -1, 0), z_dir=(0, 0, 1))):
        Circle(CYLINDER1769_R)
    extrude(amount=CYLINDER1769_DEPTH)


with BuildPart() as v_lec1766:
    # Cylinder1766 → Cylinder1766 (new body)
    with BuildSketch(Plane.XY):
        Circle(CYLINDER1766_R)
    extrude(amount=CYLINDER1766_DEPTH)


with BuildPart() as v_lec1766_1:
    # Cylinder1766 placement: moved
    add(v_lec1766.part.moved(Location((-22.627417, -22.627417, 0))).rotate(Axis((-22.627417, -22.627417, 0), (0, 0, -1)), CYLINDER1766_PLACEMENT_ANGLE))


with BuildPart() as compound881:
    # Cylinder1771 → Cylinder1771 (new body)
    with BuildSketch(Plane(origin=(0, -32, 0), x_dir=(1, 0, 0), z_dir=(0, 0, 1))):
        Circle(CYLINDER1771_R)
    extrude(amount=CYLINDER1771_DEPTH)

    # Compound881: union Válec1770, Válec1768, Válec1764, Válec1767, Válec1765, Válec1769, Válec1766
    add(v_lec1770_1.part)
    add(v_lec1768.part)
    add(v_lec1764_1.part)
    add(v_lec1767.part)
    add(v_lec1765_1.part)
    add(v_lec1769.part)
    add(v_lec1766_1.part)


with BuildPart() as cut512:
    # Tube086 → Tube086 (new body)
    with BuildSketch(Plane.XY):
        Circle(TUBE086_R)
        Circle(TUBE086_R_2, mode=Mode.SUBTRACT)
    extrude(amount=TUBE086_DEPTH)

    # Cut511: cut Compound881
    add(compound881.part, mode=Mode.SUBTRACT)

    # Cut512: cut Compound878
    add(compound878.part, mode=Mode.SUBTRACT)


solid = cut512.part
